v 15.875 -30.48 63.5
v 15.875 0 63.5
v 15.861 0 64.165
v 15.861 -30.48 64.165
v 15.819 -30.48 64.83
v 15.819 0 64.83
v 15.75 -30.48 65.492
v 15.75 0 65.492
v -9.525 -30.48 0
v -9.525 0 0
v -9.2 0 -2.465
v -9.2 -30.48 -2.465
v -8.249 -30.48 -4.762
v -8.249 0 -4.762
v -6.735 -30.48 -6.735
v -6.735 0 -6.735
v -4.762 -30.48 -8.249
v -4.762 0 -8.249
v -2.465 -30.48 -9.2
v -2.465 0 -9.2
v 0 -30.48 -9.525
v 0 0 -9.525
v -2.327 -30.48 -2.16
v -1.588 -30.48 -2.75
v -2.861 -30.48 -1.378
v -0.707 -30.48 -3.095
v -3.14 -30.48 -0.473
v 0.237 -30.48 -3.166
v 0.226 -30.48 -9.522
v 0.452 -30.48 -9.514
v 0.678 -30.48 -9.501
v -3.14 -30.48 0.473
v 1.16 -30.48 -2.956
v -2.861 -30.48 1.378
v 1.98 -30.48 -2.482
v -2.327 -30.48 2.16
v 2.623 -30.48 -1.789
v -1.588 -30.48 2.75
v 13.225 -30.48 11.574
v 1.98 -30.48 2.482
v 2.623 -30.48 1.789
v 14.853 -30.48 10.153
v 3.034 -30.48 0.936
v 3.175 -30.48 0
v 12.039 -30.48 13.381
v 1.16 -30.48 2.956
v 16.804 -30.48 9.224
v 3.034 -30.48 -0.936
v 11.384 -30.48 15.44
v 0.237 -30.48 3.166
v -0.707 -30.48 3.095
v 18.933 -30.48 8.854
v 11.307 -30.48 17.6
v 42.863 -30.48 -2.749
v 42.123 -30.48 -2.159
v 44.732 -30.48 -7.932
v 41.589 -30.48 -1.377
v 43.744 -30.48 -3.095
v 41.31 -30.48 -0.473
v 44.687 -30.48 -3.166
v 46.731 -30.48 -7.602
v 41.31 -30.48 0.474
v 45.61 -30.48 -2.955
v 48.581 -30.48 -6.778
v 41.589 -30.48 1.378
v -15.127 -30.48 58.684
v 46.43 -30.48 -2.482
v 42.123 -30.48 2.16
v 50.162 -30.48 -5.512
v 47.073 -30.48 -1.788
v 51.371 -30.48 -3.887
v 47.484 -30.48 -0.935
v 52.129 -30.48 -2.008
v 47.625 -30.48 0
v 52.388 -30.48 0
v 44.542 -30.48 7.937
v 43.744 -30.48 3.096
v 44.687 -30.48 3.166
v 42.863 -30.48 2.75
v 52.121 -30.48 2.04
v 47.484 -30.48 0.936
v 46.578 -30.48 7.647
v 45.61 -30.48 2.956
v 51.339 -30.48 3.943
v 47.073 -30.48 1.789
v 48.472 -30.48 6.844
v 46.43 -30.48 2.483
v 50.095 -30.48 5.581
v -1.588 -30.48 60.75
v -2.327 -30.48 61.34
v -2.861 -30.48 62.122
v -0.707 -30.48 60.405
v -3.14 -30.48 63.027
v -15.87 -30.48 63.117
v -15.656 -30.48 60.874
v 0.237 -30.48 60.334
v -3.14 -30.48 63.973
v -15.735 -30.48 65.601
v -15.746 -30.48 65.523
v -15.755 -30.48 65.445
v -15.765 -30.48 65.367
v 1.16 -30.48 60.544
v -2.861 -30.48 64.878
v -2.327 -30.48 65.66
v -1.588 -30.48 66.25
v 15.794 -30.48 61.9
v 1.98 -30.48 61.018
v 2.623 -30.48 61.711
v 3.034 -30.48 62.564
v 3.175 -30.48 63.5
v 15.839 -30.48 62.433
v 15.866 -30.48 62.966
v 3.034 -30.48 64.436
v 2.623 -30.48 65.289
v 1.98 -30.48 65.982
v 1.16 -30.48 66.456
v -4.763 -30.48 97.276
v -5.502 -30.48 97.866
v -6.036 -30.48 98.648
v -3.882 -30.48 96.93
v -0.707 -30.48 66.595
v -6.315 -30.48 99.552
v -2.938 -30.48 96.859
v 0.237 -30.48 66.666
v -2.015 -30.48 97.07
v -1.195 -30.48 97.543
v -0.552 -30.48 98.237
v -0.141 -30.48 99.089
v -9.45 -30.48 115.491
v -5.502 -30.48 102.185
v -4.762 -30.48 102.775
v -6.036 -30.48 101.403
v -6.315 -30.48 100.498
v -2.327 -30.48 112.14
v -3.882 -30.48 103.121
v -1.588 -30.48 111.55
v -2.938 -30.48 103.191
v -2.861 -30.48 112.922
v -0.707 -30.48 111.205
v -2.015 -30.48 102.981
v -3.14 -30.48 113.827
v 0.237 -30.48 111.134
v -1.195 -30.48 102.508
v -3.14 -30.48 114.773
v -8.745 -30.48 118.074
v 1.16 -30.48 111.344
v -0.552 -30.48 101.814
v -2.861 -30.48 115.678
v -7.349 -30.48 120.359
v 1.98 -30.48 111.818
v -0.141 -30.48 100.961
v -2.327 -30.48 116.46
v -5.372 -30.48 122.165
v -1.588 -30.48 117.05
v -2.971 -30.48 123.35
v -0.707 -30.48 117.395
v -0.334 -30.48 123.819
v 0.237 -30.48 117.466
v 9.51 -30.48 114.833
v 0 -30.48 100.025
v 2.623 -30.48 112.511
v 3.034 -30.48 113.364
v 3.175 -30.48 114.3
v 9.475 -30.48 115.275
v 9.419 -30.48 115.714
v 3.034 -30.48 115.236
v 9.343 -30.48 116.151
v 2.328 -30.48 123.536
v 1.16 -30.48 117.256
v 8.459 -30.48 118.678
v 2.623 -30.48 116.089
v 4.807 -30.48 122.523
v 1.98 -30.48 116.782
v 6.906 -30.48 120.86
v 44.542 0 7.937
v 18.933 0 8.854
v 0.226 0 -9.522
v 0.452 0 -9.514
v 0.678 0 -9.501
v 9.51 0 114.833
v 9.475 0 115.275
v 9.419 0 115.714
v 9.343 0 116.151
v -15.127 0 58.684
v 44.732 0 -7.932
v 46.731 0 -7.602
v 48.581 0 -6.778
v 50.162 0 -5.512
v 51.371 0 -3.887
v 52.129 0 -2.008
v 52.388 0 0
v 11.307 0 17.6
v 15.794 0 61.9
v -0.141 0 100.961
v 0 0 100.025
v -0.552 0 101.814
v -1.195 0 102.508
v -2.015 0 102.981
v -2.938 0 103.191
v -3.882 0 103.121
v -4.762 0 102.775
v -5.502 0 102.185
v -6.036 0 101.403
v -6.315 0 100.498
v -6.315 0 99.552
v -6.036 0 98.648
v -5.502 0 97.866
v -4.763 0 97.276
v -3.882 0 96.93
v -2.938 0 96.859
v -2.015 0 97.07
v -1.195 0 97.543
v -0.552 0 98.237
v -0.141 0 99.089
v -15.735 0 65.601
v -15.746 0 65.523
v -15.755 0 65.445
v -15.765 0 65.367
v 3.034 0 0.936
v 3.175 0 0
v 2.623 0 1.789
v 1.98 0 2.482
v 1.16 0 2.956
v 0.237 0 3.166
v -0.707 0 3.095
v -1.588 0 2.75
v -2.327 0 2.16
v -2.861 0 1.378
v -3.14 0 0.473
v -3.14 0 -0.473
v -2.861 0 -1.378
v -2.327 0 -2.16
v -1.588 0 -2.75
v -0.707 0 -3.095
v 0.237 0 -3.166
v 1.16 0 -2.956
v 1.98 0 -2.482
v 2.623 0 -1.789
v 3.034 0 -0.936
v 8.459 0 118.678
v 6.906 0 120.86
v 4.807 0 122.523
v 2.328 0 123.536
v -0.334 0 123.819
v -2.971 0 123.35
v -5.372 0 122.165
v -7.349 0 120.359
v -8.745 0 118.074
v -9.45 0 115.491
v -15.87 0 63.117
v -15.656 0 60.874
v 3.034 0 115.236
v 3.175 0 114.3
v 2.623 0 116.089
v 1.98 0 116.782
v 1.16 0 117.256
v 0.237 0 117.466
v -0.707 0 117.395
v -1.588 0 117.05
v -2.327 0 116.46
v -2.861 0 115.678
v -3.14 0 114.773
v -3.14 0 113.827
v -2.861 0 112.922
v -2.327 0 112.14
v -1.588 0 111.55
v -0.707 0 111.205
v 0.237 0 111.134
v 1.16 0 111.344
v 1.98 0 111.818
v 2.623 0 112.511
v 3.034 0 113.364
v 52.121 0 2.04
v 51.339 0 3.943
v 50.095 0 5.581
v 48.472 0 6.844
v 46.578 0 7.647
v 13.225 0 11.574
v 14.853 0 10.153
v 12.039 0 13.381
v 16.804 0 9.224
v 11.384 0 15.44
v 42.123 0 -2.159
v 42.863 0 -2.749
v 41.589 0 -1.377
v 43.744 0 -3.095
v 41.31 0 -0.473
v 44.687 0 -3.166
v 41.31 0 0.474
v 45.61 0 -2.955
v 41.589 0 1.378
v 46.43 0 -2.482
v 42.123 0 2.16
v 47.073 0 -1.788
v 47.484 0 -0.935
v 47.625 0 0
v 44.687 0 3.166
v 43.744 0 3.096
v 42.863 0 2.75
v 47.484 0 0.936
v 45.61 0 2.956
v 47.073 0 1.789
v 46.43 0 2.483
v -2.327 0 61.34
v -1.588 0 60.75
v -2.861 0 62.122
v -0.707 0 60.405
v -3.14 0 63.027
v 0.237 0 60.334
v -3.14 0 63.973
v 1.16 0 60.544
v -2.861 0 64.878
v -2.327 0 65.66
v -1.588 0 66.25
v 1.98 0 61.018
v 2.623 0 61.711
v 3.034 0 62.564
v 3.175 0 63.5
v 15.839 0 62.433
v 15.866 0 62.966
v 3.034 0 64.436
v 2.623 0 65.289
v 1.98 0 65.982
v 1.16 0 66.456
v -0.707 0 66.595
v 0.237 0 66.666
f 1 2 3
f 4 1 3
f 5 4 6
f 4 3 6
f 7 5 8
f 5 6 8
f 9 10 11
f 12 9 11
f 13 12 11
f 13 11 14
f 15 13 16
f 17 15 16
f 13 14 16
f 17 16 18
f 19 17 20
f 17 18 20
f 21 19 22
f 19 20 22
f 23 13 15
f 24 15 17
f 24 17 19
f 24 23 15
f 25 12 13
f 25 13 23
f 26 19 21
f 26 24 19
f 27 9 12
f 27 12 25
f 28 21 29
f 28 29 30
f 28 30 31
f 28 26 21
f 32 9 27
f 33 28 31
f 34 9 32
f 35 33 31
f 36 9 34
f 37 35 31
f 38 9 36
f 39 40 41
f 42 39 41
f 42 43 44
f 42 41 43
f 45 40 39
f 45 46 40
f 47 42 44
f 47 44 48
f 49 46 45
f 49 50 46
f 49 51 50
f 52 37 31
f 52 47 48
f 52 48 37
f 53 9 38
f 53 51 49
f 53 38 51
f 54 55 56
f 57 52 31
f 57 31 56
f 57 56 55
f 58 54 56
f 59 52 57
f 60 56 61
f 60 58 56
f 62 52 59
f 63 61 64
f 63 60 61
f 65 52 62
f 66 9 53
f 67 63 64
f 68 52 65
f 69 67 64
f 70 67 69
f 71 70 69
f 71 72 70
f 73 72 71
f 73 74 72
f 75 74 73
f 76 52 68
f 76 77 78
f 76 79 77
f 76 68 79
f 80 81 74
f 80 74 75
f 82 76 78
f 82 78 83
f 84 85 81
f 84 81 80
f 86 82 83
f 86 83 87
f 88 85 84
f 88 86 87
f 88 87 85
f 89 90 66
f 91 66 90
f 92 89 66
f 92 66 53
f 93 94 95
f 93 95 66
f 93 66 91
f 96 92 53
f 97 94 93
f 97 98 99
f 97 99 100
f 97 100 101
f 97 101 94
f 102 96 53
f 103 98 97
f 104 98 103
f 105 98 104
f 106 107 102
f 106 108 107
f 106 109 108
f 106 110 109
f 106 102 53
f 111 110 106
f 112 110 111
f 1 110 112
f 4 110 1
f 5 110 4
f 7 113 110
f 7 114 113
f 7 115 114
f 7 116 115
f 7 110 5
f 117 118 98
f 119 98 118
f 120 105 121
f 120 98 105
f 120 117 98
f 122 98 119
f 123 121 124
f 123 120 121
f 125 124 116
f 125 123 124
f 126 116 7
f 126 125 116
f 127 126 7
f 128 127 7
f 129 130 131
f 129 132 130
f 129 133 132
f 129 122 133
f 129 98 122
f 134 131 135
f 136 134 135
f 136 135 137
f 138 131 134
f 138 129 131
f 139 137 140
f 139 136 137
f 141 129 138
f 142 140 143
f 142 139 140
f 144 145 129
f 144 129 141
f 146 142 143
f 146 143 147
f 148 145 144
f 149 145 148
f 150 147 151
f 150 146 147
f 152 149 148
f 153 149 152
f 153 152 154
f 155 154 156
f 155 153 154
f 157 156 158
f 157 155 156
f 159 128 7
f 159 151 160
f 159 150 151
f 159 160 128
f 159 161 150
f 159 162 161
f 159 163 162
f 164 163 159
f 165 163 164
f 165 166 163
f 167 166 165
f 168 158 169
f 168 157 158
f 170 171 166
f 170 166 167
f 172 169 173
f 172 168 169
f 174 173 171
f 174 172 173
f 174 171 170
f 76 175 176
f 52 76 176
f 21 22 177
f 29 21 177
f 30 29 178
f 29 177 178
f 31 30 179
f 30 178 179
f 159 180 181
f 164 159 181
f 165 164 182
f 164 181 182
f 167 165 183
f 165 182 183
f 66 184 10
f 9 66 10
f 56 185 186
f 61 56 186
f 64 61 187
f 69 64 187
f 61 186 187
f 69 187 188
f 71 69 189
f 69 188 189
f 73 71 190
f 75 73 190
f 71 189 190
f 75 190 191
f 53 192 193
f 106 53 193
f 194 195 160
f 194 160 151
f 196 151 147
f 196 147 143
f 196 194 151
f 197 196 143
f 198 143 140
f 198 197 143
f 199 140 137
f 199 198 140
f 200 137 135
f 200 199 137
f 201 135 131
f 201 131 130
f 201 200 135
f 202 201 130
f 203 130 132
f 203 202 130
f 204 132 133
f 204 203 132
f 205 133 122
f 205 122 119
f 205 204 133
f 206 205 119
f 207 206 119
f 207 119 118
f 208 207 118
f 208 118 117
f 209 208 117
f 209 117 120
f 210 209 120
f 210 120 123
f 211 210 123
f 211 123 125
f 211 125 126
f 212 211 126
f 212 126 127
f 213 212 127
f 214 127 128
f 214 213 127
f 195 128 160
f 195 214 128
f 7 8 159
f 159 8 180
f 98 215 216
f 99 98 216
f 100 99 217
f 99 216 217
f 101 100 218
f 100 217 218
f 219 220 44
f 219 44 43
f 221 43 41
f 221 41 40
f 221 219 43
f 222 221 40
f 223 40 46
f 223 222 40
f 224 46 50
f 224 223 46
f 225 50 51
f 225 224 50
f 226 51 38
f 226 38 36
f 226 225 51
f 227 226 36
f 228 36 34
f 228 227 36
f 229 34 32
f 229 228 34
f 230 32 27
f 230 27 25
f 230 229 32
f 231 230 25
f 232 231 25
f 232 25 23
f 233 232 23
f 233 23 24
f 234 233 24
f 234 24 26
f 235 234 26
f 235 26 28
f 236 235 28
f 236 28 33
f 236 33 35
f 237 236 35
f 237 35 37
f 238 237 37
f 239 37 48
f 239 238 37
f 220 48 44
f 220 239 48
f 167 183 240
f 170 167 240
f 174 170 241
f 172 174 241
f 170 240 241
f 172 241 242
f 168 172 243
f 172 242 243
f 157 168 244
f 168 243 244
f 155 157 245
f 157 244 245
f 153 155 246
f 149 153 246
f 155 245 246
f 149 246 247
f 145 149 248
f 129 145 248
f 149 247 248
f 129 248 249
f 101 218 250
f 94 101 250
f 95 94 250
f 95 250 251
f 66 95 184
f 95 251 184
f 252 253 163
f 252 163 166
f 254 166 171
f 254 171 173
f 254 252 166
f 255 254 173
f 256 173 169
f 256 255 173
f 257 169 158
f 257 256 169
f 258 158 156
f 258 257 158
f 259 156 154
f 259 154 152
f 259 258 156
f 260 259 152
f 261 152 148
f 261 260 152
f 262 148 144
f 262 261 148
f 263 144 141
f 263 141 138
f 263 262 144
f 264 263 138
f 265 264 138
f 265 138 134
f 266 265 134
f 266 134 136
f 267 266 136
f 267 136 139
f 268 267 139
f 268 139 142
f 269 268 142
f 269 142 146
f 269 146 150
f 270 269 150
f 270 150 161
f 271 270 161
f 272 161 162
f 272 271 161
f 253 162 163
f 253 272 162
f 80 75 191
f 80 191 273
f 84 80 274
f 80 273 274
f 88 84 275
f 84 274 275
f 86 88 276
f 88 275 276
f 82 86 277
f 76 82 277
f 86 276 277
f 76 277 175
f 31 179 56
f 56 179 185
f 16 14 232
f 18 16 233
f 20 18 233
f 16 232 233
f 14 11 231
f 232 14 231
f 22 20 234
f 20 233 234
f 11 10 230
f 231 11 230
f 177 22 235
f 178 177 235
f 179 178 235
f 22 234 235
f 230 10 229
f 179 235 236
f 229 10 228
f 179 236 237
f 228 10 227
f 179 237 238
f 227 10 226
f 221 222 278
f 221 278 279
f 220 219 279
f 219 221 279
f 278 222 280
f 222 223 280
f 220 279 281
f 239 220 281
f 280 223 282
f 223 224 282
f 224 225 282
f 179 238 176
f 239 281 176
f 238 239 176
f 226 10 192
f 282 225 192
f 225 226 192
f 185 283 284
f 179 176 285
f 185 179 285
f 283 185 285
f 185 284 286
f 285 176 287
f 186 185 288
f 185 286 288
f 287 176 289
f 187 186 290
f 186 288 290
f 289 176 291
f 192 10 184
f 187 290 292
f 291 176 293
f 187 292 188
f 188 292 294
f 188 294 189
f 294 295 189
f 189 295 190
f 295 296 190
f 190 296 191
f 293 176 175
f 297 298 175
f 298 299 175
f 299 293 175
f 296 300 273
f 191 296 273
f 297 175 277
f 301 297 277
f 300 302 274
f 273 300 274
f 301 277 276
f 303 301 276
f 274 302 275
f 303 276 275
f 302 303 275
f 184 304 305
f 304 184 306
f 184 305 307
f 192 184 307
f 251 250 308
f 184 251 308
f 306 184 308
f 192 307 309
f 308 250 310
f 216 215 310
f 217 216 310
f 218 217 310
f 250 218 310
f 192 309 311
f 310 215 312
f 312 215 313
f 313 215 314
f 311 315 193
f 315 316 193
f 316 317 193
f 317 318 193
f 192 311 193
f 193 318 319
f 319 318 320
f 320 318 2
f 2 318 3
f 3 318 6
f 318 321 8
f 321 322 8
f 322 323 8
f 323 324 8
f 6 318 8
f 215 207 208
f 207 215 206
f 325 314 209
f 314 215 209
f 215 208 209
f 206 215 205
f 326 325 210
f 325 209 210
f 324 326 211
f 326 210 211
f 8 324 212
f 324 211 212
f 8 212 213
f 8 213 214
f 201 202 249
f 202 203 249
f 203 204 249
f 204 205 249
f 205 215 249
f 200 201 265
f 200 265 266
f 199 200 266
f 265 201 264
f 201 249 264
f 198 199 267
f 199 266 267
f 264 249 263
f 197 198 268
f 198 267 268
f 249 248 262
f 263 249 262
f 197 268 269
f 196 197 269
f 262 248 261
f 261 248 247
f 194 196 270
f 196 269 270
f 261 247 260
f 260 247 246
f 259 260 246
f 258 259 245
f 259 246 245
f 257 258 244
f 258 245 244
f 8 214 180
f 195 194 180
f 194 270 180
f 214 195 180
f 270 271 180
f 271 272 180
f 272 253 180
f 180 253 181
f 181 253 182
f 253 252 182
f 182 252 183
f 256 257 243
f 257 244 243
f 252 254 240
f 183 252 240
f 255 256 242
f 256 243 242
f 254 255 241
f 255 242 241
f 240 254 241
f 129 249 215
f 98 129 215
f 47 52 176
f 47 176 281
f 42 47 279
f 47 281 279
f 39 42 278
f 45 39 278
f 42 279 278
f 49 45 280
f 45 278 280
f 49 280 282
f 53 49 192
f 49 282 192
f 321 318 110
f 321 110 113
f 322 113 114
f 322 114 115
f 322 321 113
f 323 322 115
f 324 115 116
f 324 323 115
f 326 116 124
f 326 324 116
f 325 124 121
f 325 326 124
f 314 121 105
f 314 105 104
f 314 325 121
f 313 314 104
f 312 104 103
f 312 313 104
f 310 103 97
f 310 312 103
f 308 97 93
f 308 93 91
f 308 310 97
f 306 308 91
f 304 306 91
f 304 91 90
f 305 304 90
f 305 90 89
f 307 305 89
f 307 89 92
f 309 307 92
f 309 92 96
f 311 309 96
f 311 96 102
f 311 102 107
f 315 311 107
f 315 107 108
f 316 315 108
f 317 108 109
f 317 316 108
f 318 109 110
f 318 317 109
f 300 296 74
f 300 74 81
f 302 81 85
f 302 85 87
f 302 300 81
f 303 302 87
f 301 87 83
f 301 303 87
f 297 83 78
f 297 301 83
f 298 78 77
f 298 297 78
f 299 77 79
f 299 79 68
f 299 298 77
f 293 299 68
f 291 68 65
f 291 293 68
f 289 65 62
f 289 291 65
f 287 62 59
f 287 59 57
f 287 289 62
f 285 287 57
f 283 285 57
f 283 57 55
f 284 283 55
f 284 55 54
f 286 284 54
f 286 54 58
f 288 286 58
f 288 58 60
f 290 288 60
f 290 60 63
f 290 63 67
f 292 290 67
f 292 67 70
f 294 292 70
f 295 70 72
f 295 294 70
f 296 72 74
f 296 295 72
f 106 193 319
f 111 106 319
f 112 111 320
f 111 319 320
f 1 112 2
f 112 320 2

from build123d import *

# Parameters (mm, degrees)
F0_R     = 3.175
F1_DEPTH = 30.48


with BuildPart() as f1:
    # F0 (on Front) → F1 (new body)
    with BuildSketch(Plane.XZ):
        with BuildLine():
            Line((9.510055, 114.833363), (9.343463, 116.150762))
            ThreePointArc((9.343463, 116.150762), (-0.334404, 123.819128), (-9.450303, 115.490543))
            ThreePointArc((-9.450303, 115.490543), (-0.596442, 104.793693), (9.525, 114.3))
            ThreePointArc((9.525, 114.3), (9.521263, 114.566786), (9.510055, 114.833363))
        make_face()
        with Locations((0, 114.3)):
            Circle(F0_R, mode=Mode.SUBTRACT)
        with BuildLine():
            ThreePointArc((9.510055, 114.833363), (9.449745, 115.494969), (9.343463, 116.150762))
            Line((9.343463, 116.150762), (9.510055, 114.833363))
        make_face()
        with BuildLine():
            ThreePointArc((9.525, 114.3), (-0.596442, 104.793693), (-9.450303, 115.490543))
            Line((-9.450303, 115.490543), (-15.735324, 65.601239))
            ThreePointArc((-15.735324, 65.601239), (0.055273, 79.374904), (15.749574, 65.491615))
            Line((15.749574, 65.491615), (9.510055, 114.833363))
            ThreePointArc((9.510055, 114.833363), (9.521263, 114.566786), (9.525, 114.3))
        make_face()
        with Locations((-3.175, 100.0252)):
            Circle(F0_R, mode=Mode.SUBTRACT)
        with BuildLine():
            Line((-15.764817, 65.367128), (-15.735324, 65.601239))
            ThreePointArc((-15.735324, 65.601239), (-15.750506, 65.484238), (-15.764817, 65.367128))
        make_face()
        with BuildLine():
            ThreePointArc((15.749574, 65.491615), (0.055273, 79.374904), (-15.735324, 65.601239))
            Line((-15.735324, 65.601239), (-15.764817, 65.367128))
            Line((-15.764817, 65.367128), (-15.12686, 58.684014))
            ThreePointArc((-15.12686, 58.684014), (1.642434, 47.710192), (15.794203, 61.90038))
            ThreePointArc((15.794203, 61.90038), (15.854788, 62.699171), (15.875, 63.5))
            ThreePointArc((15.875, 63.5), (15.843612, 64.49778), (15.749574, 65.491615))
        make_face()
        with Locations((0, 63.5)):
            Circle(F0_R, mode=Mode.SUBTRACT)
        with BuildLine():
            Line((-15.12686, 58.684014), (-15.764817, 65.367128))
            ThreePointArc((-15.764817, 65.367128), (-15.803162, 61.991461), (-15.12686, 58.684014))
        make_face()
        with BuildLine():
            ThreePointArc((15.794203, 61.90038), (1.642434, 47.710192), (-15.12686, 58.684014))
            Line((-15.12686, 58.684014), (-9.525, 0))
            ThreePointArc((-9.525, 0), (0, 9.525), (9.525, 0))
            ThreePointArc((9.525, 0), (6.97061, -6.491242), (0.677501, -9.500875))
            Line((0.677501, -9.500875), (44.732484, -7.932102))
            ThreePointArc((44.732484, -7.932102), (36.513087, -0.09504), (44.541716, 7.937341))
            Line((44.541716, 7.937341), (18.932946, 8.853652))
            ThreePointArc((18.932946, 8.853652), (13.224775, 11.574196), (11.307494, 17.599858))
            Line((11.307494, 17.599858), (15.794203, 61.90038))
        make_face()
        with BuildLine():
            ThreePointArc((9.525, 0), (0, 9.525), (-9.525, 0))
            ThreePointArc((-9.525, 0), (-6.735192, -6.735192), (0, -9.525))
            Line((0, -9.525), (0.677501, -9.500875))
            ThreePointArc((0.677501, -9.500875), (6.97061, -6.491242), (9.525, 0))
        make_face()
        Circle(F0_R, mode=Mode.SUBTRACT)
        with BuildLine():
            Line((0.677501, -9.500875), (0, -9.525))
            ThreePointArc((0, -9.525), (0.338965, -9.518967), (0.677501, -9.500875))
        make_face()
        with BuildLine():
            ThreePointArc((52.387513, 0.00037), (50.095002, 5.580514), (44.541716, 7.937341))
            ThreePointArc((44.541716, 7.937341), (36.513087, -0.09504), (44.732484, -7.932102))
            ThreePointArc((44.732484, -7.932102), (50.161669, -5.511516), (52.387513, 0.00037))
        make_face()
        with Locations((44.450013, 0.00037)):
            Circle(F0_R, mode=Mode.SUBTRACT)
    extrude(amount=F1_DEPTH)


solid = f1.part
